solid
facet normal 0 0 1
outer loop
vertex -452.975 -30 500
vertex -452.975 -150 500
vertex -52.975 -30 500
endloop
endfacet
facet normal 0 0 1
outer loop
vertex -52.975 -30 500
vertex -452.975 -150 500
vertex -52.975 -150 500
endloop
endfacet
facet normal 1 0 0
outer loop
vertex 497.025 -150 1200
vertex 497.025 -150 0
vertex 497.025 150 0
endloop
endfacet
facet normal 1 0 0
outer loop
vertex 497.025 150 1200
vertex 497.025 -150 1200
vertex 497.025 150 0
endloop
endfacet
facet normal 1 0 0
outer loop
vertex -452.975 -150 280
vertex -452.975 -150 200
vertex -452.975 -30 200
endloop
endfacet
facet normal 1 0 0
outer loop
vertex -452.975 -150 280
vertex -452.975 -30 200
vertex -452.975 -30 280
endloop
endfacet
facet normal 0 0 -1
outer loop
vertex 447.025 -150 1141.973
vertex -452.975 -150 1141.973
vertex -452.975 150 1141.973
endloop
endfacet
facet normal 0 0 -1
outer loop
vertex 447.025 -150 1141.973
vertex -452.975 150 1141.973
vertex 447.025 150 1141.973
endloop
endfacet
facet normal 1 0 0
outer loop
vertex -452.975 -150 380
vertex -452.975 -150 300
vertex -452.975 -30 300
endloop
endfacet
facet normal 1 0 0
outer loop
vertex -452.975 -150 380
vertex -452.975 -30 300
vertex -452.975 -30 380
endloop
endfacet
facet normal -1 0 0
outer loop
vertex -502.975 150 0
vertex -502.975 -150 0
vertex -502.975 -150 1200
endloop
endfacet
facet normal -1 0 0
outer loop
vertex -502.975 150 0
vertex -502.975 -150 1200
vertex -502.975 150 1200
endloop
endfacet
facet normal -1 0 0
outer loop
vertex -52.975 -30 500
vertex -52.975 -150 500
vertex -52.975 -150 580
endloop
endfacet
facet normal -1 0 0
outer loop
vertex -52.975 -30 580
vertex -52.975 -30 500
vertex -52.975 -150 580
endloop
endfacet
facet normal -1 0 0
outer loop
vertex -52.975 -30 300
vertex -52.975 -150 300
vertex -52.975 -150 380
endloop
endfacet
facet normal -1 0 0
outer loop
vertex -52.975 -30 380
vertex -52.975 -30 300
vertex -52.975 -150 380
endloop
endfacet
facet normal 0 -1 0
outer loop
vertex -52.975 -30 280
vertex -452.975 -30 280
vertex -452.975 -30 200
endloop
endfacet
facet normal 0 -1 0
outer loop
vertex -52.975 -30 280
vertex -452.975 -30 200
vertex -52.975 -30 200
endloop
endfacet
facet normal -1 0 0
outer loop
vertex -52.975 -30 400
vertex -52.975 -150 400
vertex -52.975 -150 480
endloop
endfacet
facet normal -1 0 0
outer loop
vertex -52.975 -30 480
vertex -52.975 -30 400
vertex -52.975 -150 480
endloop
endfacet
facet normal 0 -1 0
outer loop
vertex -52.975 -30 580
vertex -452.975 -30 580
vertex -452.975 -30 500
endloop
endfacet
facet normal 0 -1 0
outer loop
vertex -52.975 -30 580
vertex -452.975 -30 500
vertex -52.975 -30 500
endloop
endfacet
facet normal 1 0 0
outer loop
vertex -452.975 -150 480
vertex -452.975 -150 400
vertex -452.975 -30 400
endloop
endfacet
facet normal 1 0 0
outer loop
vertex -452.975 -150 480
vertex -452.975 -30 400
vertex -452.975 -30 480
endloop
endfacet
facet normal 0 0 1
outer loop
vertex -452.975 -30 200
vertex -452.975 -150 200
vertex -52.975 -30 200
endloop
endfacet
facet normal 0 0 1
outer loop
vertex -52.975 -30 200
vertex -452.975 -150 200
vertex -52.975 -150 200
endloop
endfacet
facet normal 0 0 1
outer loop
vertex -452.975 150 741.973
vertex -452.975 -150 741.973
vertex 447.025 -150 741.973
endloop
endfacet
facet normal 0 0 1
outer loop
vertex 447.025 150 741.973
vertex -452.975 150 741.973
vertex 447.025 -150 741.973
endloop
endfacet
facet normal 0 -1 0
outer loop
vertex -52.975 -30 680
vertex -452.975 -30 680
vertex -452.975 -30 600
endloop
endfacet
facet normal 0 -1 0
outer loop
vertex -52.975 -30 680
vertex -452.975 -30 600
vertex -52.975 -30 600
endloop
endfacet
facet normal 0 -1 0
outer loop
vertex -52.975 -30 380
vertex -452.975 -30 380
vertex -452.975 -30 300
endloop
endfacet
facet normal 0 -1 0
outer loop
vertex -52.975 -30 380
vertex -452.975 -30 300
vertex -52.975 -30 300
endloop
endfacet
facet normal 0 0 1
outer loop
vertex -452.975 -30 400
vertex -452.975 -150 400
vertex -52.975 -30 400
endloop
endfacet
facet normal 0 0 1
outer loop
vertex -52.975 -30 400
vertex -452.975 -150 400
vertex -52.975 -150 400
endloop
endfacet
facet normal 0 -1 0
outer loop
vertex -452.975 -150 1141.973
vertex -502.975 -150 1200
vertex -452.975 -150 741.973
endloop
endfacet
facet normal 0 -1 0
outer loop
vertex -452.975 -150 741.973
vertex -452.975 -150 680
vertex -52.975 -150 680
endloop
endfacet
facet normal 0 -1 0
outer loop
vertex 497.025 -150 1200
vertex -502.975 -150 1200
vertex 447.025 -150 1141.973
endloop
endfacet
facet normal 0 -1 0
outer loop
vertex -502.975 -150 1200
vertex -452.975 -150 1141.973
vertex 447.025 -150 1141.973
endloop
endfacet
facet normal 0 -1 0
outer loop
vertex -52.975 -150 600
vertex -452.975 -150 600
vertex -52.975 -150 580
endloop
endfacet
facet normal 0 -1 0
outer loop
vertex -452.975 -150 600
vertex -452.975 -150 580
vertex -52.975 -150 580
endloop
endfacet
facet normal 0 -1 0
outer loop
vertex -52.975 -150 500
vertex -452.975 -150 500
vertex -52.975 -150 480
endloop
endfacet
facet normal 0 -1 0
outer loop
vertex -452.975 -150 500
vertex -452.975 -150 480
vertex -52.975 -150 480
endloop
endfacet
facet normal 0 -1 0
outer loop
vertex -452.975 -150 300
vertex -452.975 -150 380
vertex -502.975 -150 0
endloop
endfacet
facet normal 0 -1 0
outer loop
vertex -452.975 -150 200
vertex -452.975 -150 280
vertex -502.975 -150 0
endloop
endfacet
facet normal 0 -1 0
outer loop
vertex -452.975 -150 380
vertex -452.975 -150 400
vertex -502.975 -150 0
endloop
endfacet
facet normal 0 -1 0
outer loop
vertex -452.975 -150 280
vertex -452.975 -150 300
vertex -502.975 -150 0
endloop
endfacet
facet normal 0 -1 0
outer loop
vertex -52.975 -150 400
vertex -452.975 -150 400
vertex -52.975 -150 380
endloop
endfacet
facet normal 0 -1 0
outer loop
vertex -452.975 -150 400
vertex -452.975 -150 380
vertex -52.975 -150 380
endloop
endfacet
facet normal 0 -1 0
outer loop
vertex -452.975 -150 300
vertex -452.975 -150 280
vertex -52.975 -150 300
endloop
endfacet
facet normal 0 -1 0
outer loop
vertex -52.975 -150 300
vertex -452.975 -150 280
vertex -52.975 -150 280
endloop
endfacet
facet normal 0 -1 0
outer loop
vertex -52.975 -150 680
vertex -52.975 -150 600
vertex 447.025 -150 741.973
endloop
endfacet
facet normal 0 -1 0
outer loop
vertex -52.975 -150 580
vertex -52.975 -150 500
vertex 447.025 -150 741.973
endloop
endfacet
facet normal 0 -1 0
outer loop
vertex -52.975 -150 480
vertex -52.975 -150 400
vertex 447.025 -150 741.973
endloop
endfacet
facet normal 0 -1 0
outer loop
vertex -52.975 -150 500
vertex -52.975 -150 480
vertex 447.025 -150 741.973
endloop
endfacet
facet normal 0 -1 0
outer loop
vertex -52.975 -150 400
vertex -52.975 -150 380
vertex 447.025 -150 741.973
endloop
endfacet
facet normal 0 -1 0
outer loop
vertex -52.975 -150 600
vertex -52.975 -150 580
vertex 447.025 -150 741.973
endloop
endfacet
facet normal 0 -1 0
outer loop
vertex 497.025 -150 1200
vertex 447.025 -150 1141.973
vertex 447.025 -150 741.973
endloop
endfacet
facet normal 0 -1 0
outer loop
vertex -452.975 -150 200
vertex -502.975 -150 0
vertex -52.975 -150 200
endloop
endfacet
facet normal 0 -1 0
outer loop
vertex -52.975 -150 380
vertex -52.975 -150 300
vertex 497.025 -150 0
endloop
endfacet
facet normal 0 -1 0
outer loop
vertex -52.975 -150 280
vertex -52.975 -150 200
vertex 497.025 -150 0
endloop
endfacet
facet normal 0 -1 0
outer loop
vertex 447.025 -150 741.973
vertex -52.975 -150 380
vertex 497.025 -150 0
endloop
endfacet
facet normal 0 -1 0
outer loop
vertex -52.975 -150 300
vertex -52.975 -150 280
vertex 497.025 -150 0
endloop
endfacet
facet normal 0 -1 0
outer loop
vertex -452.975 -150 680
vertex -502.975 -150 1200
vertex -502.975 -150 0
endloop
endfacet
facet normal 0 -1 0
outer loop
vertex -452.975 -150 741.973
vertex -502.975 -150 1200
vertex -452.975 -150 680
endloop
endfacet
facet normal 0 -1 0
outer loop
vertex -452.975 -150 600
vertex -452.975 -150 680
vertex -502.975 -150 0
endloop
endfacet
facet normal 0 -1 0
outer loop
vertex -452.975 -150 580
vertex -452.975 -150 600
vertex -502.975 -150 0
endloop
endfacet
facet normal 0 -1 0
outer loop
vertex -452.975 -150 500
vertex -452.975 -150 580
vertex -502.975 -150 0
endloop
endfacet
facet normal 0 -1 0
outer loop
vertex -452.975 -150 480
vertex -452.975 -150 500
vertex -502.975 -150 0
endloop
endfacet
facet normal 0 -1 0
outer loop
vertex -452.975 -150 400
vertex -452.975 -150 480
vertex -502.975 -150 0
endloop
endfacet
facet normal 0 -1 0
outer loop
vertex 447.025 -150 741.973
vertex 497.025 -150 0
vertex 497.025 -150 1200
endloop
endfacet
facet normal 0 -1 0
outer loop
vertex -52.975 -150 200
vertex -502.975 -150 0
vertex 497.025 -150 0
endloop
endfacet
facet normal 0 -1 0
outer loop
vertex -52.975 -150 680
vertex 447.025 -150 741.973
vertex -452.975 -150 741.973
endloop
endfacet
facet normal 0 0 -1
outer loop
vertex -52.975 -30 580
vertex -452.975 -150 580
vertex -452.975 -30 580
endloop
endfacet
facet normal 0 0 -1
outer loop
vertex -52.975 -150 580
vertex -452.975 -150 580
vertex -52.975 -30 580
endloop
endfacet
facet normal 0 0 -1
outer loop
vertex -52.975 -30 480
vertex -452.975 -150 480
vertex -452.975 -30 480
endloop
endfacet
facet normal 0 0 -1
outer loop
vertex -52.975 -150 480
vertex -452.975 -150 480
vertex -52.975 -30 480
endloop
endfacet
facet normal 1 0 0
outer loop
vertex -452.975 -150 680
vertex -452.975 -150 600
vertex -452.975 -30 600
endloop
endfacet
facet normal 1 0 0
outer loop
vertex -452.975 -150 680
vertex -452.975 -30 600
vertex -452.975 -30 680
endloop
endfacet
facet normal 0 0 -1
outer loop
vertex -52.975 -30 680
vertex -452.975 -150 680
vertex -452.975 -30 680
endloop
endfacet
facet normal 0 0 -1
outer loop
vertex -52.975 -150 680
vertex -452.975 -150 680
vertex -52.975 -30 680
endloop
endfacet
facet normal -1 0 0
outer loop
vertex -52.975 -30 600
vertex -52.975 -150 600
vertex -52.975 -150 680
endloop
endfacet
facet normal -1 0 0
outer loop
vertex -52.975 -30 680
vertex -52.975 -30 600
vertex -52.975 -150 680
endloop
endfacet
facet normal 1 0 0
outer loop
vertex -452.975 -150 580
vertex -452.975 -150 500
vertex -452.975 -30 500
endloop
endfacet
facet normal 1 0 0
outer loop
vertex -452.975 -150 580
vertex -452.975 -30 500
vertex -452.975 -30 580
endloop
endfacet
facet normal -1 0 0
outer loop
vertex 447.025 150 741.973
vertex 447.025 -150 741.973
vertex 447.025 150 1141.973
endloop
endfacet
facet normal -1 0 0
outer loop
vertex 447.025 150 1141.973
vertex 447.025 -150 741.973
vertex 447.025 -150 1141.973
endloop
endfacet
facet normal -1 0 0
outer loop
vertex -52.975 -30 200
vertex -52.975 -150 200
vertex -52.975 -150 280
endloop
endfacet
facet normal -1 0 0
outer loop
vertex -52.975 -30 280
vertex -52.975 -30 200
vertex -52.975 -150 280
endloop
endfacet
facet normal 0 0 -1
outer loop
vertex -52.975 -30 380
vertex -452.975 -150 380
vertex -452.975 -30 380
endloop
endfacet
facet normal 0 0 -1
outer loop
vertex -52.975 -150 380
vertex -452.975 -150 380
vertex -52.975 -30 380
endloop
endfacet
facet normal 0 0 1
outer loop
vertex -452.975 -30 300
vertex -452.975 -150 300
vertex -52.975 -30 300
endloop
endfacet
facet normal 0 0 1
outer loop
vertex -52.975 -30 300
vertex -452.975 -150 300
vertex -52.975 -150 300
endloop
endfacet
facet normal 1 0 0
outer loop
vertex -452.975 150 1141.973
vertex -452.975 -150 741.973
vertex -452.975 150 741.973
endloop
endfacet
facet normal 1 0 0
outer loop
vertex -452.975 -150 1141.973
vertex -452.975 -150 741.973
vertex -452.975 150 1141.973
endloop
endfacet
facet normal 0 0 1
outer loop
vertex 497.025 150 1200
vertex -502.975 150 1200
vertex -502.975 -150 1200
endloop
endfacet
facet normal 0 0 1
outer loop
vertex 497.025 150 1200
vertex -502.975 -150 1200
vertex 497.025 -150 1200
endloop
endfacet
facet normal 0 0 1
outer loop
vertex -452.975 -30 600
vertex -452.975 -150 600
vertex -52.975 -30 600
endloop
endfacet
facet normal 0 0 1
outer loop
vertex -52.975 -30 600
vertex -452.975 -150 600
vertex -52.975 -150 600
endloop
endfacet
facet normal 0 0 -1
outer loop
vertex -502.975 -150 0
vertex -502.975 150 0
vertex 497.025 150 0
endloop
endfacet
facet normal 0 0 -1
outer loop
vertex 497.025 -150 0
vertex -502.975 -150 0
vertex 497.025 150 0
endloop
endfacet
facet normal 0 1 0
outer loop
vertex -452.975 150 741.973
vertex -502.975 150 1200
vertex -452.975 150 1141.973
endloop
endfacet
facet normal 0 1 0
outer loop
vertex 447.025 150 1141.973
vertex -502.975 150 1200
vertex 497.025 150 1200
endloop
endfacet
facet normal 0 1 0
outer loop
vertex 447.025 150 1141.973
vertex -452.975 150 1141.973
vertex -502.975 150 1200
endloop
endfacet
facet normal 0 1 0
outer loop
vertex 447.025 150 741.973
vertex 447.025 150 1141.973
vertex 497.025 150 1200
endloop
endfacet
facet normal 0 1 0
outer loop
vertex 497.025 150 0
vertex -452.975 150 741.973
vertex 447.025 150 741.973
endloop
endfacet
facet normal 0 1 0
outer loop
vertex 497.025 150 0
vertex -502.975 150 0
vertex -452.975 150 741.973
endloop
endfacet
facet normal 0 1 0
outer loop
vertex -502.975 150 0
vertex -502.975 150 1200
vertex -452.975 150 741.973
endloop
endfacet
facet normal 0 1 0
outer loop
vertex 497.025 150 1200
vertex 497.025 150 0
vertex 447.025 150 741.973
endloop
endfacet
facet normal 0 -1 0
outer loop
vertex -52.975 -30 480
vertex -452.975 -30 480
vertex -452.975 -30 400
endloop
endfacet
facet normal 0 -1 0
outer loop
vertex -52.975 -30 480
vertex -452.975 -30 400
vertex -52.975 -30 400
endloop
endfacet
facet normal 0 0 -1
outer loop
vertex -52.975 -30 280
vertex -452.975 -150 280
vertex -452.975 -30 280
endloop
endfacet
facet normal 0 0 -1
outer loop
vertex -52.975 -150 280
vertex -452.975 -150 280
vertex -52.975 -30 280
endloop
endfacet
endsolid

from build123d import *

# Parameters (mm, degrees)
F0_W     = 1000
F0_H     = 300
F1_DEPTH = 1200
F2_W     = 400
F2_H     = 80
F3_DEPTH = 120
F4_W     = 900
F4_H     = 400
F5_DEPTH = 300


with BuildPart() as f1:
    # F0 (on Top) → F1 (new body)
    with BuildSketch(Plane.XY):
        with Locations((-2.975285, 0)):
            Rectangle(F0_W, F0_H)
    extrude(amount=F1_DEPTH)

    # F2 (on face) → F3 (cut)
    with BuildSketch(Plane.XZ.offset(150)):
        with Locations((-252.975285, 640)):
            Rectangle(F2_W, F2_H)
        with Locations((-252.975285, 540)):
            Rectangle(F2_W, F2_H)
        with Locations((-252.975285, 440)):
            Rectangle(F2_W, F2_H)
        with Locations((-252.975285, 340)):
            Rectangle(F2_W, F2_H)
        with Locations((-252.975285, 240)):
            Rectangle(F2_W, F2_H)
    extrude(amount=-F3_DEPTH, mode=Mode.SUBTRACT)

    # F4 (on face) → F5 (cut)
    with BuildSketch(Plane.XZ.offset(150)):
        with Locations((-2.975285, 941.9734)):
            Rectangle(F4_W, F4_H)
    extrude(amount=-F5_DEPTH, mode=Mode.SUBTRACT)


solid = f1.part
